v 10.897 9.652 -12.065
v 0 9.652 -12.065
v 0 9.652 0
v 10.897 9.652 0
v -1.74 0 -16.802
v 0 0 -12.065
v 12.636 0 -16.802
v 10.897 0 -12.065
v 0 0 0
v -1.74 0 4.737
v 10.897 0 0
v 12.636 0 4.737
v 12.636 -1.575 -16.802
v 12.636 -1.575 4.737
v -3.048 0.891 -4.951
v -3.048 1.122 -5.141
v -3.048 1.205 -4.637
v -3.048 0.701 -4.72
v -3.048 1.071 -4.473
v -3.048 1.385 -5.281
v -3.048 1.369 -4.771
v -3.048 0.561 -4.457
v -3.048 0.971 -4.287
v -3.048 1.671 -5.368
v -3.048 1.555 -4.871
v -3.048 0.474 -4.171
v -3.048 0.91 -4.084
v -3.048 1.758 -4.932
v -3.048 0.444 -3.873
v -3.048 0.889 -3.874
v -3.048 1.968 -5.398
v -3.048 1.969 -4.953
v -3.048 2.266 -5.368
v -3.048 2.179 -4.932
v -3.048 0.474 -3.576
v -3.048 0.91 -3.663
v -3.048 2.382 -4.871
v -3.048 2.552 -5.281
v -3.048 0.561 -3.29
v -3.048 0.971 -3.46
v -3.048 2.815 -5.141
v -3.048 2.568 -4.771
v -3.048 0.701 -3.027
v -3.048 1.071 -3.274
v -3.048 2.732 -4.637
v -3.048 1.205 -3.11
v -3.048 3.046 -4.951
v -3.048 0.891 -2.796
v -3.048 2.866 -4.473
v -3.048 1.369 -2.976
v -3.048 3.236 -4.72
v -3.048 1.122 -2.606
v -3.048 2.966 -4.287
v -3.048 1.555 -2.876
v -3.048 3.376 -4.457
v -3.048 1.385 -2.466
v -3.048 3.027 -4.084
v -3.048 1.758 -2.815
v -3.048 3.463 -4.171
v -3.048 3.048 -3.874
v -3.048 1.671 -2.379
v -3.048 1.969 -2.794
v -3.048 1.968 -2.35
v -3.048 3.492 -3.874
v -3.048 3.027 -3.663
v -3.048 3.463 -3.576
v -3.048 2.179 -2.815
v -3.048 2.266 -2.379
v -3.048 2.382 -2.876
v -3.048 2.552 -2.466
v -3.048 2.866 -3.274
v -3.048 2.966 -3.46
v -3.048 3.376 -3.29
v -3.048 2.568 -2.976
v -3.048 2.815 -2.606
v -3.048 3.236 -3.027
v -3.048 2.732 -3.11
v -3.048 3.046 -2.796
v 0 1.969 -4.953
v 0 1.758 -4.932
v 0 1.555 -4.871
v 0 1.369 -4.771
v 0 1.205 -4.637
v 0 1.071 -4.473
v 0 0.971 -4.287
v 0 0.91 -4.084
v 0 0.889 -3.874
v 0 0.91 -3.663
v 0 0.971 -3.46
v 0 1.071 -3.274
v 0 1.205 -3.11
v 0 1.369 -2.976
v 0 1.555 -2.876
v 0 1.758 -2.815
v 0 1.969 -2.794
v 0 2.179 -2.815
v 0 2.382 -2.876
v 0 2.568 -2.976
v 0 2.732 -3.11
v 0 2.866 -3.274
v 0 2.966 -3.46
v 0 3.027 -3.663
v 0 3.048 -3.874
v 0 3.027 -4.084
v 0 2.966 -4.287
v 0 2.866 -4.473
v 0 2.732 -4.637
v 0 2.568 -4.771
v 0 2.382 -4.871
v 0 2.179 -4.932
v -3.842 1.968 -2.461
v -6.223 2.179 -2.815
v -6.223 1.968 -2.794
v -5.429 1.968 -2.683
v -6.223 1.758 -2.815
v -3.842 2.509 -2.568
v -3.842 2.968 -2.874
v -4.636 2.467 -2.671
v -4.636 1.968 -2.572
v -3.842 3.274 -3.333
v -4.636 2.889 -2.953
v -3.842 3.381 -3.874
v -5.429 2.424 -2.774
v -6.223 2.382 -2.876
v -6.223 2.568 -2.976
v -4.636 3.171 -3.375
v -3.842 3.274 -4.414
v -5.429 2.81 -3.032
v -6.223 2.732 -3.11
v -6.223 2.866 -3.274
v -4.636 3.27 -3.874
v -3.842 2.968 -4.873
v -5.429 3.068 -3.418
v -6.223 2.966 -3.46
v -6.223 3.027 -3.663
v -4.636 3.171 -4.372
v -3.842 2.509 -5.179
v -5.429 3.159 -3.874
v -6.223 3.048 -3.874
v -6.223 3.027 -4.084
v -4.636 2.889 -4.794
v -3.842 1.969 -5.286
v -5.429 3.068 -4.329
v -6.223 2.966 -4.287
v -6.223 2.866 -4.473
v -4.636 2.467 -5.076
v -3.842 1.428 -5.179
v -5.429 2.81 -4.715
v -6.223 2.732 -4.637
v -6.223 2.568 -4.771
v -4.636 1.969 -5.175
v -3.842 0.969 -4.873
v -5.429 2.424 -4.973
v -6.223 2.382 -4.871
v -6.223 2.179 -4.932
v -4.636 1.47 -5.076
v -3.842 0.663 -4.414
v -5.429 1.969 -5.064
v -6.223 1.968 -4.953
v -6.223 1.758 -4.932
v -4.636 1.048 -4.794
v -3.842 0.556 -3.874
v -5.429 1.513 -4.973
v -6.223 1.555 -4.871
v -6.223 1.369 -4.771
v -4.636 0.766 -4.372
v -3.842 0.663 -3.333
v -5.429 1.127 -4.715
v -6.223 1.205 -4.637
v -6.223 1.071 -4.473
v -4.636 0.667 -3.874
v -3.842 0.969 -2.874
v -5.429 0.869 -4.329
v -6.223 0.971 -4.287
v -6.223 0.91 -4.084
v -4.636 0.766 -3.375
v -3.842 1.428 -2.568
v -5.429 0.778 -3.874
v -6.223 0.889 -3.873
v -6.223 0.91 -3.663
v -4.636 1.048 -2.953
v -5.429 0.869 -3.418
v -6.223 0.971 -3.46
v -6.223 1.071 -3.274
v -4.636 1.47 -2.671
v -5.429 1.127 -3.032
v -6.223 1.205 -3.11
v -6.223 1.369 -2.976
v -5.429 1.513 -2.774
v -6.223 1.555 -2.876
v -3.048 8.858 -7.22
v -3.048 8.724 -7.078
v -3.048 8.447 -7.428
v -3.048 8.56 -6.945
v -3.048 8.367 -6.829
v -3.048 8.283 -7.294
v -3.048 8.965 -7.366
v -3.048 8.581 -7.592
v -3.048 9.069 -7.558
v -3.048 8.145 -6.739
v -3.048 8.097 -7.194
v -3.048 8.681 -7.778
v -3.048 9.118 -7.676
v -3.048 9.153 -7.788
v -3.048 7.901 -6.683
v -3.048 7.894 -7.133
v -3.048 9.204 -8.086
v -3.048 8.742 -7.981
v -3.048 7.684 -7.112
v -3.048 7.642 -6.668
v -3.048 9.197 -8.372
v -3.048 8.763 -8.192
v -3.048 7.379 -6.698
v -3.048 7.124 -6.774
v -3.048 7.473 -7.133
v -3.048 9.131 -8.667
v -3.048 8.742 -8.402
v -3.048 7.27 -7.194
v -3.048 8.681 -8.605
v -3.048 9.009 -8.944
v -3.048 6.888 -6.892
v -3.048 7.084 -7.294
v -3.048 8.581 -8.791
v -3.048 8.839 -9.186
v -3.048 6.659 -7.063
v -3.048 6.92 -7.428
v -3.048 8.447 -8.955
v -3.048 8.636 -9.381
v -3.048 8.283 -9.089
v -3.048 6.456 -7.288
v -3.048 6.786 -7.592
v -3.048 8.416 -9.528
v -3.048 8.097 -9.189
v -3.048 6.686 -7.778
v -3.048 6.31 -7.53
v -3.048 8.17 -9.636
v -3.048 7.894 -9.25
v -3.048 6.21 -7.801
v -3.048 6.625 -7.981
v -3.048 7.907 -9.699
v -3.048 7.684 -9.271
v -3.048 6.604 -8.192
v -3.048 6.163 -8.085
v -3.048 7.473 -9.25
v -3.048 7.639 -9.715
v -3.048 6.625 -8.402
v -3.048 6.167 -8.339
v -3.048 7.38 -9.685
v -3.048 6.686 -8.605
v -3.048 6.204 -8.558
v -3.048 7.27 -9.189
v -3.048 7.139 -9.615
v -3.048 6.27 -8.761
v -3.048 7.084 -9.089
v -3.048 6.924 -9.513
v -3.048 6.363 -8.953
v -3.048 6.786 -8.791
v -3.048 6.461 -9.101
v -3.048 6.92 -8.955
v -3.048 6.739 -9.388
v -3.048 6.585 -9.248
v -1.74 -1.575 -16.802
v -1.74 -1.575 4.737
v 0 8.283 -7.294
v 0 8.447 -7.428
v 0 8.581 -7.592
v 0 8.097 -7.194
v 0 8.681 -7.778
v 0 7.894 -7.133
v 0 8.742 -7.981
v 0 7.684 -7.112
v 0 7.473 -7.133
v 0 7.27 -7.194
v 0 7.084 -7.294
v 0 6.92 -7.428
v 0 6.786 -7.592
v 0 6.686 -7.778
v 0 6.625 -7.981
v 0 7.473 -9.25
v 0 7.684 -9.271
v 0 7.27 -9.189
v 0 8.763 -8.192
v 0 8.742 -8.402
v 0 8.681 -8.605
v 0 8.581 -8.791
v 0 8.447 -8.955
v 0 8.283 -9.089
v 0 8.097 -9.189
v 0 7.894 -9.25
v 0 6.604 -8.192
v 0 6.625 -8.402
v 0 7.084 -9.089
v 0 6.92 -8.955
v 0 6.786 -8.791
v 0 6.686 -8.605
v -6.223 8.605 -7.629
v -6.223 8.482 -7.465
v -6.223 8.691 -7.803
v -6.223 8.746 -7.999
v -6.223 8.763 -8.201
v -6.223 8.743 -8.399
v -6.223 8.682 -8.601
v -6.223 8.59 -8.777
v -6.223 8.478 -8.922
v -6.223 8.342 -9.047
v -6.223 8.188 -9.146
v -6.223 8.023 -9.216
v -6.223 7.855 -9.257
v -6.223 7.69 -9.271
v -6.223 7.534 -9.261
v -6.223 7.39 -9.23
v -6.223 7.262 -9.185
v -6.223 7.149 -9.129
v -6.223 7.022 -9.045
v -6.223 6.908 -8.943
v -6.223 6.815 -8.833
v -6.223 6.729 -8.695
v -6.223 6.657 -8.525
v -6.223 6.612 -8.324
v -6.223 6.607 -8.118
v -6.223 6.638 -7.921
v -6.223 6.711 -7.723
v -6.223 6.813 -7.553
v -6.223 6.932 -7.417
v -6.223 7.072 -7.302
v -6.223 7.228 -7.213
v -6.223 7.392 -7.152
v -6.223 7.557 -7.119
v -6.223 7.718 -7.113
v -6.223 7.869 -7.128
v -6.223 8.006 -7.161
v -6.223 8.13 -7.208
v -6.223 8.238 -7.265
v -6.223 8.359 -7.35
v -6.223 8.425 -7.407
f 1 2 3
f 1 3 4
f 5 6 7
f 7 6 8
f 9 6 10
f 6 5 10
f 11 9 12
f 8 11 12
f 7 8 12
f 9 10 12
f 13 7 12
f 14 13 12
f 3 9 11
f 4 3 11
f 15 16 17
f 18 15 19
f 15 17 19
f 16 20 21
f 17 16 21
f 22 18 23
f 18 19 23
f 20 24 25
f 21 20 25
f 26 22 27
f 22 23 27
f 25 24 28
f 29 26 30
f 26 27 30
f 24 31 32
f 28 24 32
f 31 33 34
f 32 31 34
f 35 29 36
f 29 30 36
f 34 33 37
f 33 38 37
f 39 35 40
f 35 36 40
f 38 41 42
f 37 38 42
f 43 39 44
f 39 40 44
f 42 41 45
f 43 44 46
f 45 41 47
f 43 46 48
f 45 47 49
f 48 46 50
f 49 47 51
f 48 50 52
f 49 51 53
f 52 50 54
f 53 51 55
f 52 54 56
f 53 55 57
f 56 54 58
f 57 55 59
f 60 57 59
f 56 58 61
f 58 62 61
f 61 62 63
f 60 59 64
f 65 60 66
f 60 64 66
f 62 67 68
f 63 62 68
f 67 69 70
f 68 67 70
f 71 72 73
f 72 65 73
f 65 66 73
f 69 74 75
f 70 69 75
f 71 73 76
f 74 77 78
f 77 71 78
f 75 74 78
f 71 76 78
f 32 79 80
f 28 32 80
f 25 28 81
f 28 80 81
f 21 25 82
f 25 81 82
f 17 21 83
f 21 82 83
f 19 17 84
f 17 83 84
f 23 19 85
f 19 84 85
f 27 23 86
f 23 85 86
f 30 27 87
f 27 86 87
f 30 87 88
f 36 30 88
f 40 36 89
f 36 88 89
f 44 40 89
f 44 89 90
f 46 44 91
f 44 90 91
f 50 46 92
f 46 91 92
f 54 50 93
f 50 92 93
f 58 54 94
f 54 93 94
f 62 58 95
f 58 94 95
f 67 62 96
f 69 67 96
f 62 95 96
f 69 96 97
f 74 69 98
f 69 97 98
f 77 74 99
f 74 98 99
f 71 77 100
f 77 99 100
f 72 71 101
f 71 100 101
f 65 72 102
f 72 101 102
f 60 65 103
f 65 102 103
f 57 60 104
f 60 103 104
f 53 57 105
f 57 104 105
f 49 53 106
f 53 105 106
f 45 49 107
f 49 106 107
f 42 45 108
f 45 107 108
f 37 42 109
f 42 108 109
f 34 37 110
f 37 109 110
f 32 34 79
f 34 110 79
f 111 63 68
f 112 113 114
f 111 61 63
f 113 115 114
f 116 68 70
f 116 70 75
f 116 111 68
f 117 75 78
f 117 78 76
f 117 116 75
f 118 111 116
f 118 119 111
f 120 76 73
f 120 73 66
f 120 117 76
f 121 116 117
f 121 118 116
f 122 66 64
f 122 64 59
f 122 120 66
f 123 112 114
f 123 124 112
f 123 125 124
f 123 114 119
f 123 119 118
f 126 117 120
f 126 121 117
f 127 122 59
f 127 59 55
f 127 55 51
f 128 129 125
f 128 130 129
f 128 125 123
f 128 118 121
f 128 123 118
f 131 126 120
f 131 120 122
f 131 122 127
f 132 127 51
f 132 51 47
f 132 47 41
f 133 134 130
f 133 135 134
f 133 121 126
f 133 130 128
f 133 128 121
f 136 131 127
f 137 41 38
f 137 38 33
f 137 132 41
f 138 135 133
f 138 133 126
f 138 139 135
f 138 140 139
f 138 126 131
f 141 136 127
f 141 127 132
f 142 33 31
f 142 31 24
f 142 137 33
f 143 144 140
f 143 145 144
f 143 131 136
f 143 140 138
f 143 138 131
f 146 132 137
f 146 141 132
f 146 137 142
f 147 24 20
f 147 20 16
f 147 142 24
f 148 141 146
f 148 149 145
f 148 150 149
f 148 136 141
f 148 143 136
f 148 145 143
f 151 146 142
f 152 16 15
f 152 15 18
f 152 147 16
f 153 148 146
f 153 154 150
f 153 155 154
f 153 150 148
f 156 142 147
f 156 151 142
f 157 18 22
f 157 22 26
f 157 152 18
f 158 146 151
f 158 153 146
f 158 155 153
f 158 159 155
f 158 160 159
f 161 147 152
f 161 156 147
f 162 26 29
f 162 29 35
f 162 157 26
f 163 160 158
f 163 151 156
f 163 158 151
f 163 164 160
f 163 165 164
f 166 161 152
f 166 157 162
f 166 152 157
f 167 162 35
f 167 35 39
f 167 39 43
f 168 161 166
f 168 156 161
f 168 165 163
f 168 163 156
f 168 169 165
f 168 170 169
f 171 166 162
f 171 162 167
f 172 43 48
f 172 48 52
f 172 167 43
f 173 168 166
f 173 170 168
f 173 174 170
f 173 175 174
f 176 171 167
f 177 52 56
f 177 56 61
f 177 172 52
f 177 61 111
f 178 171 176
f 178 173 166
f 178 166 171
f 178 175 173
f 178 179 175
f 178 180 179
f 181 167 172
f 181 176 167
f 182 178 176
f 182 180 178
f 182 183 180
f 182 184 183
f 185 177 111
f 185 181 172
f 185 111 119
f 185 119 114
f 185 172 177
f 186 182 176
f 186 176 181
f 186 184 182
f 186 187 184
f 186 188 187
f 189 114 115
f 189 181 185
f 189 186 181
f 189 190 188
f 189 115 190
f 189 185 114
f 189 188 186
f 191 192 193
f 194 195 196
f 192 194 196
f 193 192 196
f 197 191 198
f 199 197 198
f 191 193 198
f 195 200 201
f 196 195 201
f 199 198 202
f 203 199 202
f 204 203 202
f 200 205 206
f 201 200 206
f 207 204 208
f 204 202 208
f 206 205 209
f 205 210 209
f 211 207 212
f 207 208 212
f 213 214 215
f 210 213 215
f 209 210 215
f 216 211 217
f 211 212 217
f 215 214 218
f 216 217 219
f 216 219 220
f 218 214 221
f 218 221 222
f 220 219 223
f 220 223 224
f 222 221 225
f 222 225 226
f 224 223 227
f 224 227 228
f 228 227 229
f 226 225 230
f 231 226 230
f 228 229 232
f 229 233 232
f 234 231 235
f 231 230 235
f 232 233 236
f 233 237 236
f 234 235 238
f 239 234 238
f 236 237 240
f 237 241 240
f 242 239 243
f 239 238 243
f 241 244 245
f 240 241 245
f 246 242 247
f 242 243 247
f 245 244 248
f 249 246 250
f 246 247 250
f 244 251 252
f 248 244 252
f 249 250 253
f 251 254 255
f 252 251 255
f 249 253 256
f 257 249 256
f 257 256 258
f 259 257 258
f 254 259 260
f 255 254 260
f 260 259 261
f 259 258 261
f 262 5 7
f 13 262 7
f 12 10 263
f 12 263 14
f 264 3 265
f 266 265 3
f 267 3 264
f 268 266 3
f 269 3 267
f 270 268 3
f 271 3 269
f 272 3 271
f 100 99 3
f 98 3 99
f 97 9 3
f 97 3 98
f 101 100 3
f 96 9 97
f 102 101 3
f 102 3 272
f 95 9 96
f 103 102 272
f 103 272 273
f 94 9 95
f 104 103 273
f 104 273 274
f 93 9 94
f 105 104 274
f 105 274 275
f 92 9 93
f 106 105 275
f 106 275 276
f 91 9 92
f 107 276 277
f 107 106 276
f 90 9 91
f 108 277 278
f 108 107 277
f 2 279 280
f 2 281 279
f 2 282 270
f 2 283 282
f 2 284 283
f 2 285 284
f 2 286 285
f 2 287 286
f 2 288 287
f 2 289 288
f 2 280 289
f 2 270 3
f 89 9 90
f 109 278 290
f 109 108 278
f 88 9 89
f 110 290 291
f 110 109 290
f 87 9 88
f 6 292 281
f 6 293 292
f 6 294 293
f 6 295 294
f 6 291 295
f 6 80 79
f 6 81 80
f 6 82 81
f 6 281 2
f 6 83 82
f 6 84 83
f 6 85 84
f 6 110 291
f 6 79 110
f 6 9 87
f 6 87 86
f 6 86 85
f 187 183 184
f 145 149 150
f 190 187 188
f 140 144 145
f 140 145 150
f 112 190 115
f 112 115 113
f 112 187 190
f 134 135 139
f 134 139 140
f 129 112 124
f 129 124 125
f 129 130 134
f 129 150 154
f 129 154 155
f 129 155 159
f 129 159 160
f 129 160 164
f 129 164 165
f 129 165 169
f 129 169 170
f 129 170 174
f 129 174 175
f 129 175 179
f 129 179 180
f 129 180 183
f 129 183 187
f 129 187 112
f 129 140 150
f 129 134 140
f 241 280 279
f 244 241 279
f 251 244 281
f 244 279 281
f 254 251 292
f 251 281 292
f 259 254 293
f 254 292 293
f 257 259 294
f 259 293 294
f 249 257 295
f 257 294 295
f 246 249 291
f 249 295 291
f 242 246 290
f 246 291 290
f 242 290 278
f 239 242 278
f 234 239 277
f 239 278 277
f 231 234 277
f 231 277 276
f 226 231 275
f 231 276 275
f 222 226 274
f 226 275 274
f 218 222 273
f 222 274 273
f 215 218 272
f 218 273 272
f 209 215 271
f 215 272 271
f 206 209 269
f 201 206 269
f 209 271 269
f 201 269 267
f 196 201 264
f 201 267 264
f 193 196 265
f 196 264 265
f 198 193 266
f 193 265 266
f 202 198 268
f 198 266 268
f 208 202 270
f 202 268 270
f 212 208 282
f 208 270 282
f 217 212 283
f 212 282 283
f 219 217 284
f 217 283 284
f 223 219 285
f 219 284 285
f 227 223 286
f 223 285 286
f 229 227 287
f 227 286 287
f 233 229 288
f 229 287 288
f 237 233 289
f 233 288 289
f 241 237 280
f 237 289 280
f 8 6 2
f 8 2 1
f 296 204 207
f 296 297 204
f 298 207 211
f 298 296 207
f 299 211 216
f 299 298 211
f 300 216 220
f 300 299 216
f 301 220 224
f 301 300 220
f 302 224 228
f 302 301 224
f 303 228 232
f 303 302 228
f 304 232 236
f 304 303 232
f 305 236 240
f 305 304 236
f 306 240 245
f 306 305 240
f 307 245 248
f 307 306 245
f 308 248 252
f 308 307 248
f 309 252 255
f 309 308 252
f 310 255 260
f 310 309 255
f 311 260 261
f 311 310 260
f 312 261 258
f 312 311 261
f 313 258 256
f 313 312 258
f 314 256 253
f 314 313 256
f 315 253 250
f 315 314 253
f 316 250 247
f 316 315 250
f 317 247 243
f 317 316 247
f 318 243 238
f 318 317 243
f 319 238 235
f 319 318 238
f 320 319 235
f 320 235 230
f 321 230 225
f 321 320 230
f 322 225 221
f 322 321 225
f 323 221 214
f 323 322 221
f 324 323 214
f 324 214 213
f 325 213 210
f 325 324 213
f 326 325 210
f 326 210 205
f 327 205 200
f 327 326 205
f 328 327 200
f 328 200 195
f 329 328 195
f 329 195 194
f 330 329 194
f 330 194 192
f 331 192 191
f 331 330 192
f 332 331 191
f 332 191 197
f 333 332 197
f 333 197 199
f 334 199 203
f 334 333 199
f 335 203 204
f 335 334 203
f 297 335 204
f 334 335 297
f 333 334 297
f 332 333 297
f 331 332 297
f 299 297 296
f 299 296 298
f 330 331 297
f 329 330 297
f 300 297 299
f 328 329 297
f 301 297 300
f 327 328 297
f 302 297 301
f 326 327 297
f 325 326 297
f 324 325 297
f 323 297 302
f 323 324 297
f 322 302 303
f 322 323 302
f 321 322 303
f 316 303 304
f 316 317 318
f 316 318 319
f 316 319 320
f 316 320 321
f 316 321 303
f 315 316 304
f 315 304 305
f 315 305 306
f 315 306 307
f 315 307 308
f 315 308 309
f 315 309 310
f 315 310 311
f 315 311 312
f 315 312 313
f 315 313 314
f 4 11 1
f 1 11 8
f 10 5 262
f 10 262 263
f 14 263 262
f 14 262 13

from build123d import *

# Parameters (mm, degrees)
SKETCH1_W           = 10.8966
SKETCH1_H           = 12.065
BOSS_EXTRUDE1_DEPTH = 9.652
SKETCH2_R           = 1.0795
BOSS_EXTRUDE2_DEPTH = 3.048
SKETCH6_R           = 1.524
SKETCH7_R           = 1.0795
SKETCH8_W           = 14.3764
SKETCH8_H           = 21.5392
BOSS_EXTRUDE3_DEPTH = 1.5748


with BuildPart() as part:
    # Sketch1 → Boss-Extrude1 (new body)
    with BuildSketch(Plane(origin=(0, 0, 0), x_dir=(1, 0, 0), z_dir=(0, 1, 0))):
        with Locations((5.4483, 6.0325)):
            Rectangle(SKETCH1_W, SKETCH1_H)
    extrude(amount=BOSS_EXTRUDE1_DEPTH)

    # Sketch2 → Boss-Extrude2 (add)
    with BuildSketch(Plane.ZY):
        with Locations(Location((-8.1915, 7.6835, 0), (0, 0, 180))):
            Circle(SKETCH2_R)
        with Locations(Location((-3.8735, 1.9685, 0), (0, 0, 180))):
            Circle(SKETCH2_R)
    extrude(amount=BOSS_EXTRUDE2_DEPTH)

    # Loft1: read off the stored shape, not the designer's step
    # Loft1: loft between two sections, ruled curve by curve
    loft1_from = [
        Edge.make_bspline([(-3.048, 9.153232542, -7.788433932), (-3.048, 9.959364678, -10.727899016), (-3.048, 7.019899594, -11.534031152), (-3.048, 6.213767458, -8.594566068), (-3.048, 5.407635322, -5.655100984), (-3.048, 8.347100406, -4.848968848), (-3.048, 9.153232542, -7.788433932)], [0, 0, 0, 0, 0.5, 0.5, 0.5, 1, 1, 1, 1], 3, [1, 0.333333333, 0.333333333, 1, 0.333333333, 0.333333333, 1]),
    ]
    loft1_to = [
        Edge.make_bspline([(-6.223, 8.482388093, -7.465484805), (-6.223, 9.934418484, -9.063260992), (-6.223, 8.336642297, -10.515291382), (-6.223, 6.884611907, -8.917515195), (-6.223, 5.432581516, -7.319739008), (-6.223, 7.030357703, -5.867708618), (-6.223, 8.482388093, -7.465484805)], [0, 0, 0, 0, 0.5, 0.5, 0.5, 1, 1, 1, 1], 3, [1, 0.333333333, 0.333333333, 1, 0.333333333, 0.333333333, 1]),
    ]
    loft1 = Solid(Shell([*[Face.make_surface_from_curves(loft1_from[k], loft1_to[k]) for k in range(1)], Face(Wire(loft1_from)), Face(Wire(loft1_to))]))
    add(loft1)

    # Sketch6 → Loft2 section 0
    with BuildSketch(Plane.ZY.offset(3.048)):
        with Locations((-3.8735, 1.9685)):
            Circle(SKETCH6_R)
    # Sketch7 → Loft2 section 1
    with BuildSketch(Plane.ZY.offset(6.223)):
        with Locations((-3.8735, 1.9685)):
            Circle(SKETCH7_R)
    loft()

    # Sketch8 → Boss-Extrude3 (add)
    with BuildSketch(Plane.XZ):
        with Locations((5.4483, -6.0325)):
            Rectangle(SKETCH8_W, SKETCH8_H)
    extrude(amount=BOSS_EXTRUDE3_DEPTH)


solid = part.part
